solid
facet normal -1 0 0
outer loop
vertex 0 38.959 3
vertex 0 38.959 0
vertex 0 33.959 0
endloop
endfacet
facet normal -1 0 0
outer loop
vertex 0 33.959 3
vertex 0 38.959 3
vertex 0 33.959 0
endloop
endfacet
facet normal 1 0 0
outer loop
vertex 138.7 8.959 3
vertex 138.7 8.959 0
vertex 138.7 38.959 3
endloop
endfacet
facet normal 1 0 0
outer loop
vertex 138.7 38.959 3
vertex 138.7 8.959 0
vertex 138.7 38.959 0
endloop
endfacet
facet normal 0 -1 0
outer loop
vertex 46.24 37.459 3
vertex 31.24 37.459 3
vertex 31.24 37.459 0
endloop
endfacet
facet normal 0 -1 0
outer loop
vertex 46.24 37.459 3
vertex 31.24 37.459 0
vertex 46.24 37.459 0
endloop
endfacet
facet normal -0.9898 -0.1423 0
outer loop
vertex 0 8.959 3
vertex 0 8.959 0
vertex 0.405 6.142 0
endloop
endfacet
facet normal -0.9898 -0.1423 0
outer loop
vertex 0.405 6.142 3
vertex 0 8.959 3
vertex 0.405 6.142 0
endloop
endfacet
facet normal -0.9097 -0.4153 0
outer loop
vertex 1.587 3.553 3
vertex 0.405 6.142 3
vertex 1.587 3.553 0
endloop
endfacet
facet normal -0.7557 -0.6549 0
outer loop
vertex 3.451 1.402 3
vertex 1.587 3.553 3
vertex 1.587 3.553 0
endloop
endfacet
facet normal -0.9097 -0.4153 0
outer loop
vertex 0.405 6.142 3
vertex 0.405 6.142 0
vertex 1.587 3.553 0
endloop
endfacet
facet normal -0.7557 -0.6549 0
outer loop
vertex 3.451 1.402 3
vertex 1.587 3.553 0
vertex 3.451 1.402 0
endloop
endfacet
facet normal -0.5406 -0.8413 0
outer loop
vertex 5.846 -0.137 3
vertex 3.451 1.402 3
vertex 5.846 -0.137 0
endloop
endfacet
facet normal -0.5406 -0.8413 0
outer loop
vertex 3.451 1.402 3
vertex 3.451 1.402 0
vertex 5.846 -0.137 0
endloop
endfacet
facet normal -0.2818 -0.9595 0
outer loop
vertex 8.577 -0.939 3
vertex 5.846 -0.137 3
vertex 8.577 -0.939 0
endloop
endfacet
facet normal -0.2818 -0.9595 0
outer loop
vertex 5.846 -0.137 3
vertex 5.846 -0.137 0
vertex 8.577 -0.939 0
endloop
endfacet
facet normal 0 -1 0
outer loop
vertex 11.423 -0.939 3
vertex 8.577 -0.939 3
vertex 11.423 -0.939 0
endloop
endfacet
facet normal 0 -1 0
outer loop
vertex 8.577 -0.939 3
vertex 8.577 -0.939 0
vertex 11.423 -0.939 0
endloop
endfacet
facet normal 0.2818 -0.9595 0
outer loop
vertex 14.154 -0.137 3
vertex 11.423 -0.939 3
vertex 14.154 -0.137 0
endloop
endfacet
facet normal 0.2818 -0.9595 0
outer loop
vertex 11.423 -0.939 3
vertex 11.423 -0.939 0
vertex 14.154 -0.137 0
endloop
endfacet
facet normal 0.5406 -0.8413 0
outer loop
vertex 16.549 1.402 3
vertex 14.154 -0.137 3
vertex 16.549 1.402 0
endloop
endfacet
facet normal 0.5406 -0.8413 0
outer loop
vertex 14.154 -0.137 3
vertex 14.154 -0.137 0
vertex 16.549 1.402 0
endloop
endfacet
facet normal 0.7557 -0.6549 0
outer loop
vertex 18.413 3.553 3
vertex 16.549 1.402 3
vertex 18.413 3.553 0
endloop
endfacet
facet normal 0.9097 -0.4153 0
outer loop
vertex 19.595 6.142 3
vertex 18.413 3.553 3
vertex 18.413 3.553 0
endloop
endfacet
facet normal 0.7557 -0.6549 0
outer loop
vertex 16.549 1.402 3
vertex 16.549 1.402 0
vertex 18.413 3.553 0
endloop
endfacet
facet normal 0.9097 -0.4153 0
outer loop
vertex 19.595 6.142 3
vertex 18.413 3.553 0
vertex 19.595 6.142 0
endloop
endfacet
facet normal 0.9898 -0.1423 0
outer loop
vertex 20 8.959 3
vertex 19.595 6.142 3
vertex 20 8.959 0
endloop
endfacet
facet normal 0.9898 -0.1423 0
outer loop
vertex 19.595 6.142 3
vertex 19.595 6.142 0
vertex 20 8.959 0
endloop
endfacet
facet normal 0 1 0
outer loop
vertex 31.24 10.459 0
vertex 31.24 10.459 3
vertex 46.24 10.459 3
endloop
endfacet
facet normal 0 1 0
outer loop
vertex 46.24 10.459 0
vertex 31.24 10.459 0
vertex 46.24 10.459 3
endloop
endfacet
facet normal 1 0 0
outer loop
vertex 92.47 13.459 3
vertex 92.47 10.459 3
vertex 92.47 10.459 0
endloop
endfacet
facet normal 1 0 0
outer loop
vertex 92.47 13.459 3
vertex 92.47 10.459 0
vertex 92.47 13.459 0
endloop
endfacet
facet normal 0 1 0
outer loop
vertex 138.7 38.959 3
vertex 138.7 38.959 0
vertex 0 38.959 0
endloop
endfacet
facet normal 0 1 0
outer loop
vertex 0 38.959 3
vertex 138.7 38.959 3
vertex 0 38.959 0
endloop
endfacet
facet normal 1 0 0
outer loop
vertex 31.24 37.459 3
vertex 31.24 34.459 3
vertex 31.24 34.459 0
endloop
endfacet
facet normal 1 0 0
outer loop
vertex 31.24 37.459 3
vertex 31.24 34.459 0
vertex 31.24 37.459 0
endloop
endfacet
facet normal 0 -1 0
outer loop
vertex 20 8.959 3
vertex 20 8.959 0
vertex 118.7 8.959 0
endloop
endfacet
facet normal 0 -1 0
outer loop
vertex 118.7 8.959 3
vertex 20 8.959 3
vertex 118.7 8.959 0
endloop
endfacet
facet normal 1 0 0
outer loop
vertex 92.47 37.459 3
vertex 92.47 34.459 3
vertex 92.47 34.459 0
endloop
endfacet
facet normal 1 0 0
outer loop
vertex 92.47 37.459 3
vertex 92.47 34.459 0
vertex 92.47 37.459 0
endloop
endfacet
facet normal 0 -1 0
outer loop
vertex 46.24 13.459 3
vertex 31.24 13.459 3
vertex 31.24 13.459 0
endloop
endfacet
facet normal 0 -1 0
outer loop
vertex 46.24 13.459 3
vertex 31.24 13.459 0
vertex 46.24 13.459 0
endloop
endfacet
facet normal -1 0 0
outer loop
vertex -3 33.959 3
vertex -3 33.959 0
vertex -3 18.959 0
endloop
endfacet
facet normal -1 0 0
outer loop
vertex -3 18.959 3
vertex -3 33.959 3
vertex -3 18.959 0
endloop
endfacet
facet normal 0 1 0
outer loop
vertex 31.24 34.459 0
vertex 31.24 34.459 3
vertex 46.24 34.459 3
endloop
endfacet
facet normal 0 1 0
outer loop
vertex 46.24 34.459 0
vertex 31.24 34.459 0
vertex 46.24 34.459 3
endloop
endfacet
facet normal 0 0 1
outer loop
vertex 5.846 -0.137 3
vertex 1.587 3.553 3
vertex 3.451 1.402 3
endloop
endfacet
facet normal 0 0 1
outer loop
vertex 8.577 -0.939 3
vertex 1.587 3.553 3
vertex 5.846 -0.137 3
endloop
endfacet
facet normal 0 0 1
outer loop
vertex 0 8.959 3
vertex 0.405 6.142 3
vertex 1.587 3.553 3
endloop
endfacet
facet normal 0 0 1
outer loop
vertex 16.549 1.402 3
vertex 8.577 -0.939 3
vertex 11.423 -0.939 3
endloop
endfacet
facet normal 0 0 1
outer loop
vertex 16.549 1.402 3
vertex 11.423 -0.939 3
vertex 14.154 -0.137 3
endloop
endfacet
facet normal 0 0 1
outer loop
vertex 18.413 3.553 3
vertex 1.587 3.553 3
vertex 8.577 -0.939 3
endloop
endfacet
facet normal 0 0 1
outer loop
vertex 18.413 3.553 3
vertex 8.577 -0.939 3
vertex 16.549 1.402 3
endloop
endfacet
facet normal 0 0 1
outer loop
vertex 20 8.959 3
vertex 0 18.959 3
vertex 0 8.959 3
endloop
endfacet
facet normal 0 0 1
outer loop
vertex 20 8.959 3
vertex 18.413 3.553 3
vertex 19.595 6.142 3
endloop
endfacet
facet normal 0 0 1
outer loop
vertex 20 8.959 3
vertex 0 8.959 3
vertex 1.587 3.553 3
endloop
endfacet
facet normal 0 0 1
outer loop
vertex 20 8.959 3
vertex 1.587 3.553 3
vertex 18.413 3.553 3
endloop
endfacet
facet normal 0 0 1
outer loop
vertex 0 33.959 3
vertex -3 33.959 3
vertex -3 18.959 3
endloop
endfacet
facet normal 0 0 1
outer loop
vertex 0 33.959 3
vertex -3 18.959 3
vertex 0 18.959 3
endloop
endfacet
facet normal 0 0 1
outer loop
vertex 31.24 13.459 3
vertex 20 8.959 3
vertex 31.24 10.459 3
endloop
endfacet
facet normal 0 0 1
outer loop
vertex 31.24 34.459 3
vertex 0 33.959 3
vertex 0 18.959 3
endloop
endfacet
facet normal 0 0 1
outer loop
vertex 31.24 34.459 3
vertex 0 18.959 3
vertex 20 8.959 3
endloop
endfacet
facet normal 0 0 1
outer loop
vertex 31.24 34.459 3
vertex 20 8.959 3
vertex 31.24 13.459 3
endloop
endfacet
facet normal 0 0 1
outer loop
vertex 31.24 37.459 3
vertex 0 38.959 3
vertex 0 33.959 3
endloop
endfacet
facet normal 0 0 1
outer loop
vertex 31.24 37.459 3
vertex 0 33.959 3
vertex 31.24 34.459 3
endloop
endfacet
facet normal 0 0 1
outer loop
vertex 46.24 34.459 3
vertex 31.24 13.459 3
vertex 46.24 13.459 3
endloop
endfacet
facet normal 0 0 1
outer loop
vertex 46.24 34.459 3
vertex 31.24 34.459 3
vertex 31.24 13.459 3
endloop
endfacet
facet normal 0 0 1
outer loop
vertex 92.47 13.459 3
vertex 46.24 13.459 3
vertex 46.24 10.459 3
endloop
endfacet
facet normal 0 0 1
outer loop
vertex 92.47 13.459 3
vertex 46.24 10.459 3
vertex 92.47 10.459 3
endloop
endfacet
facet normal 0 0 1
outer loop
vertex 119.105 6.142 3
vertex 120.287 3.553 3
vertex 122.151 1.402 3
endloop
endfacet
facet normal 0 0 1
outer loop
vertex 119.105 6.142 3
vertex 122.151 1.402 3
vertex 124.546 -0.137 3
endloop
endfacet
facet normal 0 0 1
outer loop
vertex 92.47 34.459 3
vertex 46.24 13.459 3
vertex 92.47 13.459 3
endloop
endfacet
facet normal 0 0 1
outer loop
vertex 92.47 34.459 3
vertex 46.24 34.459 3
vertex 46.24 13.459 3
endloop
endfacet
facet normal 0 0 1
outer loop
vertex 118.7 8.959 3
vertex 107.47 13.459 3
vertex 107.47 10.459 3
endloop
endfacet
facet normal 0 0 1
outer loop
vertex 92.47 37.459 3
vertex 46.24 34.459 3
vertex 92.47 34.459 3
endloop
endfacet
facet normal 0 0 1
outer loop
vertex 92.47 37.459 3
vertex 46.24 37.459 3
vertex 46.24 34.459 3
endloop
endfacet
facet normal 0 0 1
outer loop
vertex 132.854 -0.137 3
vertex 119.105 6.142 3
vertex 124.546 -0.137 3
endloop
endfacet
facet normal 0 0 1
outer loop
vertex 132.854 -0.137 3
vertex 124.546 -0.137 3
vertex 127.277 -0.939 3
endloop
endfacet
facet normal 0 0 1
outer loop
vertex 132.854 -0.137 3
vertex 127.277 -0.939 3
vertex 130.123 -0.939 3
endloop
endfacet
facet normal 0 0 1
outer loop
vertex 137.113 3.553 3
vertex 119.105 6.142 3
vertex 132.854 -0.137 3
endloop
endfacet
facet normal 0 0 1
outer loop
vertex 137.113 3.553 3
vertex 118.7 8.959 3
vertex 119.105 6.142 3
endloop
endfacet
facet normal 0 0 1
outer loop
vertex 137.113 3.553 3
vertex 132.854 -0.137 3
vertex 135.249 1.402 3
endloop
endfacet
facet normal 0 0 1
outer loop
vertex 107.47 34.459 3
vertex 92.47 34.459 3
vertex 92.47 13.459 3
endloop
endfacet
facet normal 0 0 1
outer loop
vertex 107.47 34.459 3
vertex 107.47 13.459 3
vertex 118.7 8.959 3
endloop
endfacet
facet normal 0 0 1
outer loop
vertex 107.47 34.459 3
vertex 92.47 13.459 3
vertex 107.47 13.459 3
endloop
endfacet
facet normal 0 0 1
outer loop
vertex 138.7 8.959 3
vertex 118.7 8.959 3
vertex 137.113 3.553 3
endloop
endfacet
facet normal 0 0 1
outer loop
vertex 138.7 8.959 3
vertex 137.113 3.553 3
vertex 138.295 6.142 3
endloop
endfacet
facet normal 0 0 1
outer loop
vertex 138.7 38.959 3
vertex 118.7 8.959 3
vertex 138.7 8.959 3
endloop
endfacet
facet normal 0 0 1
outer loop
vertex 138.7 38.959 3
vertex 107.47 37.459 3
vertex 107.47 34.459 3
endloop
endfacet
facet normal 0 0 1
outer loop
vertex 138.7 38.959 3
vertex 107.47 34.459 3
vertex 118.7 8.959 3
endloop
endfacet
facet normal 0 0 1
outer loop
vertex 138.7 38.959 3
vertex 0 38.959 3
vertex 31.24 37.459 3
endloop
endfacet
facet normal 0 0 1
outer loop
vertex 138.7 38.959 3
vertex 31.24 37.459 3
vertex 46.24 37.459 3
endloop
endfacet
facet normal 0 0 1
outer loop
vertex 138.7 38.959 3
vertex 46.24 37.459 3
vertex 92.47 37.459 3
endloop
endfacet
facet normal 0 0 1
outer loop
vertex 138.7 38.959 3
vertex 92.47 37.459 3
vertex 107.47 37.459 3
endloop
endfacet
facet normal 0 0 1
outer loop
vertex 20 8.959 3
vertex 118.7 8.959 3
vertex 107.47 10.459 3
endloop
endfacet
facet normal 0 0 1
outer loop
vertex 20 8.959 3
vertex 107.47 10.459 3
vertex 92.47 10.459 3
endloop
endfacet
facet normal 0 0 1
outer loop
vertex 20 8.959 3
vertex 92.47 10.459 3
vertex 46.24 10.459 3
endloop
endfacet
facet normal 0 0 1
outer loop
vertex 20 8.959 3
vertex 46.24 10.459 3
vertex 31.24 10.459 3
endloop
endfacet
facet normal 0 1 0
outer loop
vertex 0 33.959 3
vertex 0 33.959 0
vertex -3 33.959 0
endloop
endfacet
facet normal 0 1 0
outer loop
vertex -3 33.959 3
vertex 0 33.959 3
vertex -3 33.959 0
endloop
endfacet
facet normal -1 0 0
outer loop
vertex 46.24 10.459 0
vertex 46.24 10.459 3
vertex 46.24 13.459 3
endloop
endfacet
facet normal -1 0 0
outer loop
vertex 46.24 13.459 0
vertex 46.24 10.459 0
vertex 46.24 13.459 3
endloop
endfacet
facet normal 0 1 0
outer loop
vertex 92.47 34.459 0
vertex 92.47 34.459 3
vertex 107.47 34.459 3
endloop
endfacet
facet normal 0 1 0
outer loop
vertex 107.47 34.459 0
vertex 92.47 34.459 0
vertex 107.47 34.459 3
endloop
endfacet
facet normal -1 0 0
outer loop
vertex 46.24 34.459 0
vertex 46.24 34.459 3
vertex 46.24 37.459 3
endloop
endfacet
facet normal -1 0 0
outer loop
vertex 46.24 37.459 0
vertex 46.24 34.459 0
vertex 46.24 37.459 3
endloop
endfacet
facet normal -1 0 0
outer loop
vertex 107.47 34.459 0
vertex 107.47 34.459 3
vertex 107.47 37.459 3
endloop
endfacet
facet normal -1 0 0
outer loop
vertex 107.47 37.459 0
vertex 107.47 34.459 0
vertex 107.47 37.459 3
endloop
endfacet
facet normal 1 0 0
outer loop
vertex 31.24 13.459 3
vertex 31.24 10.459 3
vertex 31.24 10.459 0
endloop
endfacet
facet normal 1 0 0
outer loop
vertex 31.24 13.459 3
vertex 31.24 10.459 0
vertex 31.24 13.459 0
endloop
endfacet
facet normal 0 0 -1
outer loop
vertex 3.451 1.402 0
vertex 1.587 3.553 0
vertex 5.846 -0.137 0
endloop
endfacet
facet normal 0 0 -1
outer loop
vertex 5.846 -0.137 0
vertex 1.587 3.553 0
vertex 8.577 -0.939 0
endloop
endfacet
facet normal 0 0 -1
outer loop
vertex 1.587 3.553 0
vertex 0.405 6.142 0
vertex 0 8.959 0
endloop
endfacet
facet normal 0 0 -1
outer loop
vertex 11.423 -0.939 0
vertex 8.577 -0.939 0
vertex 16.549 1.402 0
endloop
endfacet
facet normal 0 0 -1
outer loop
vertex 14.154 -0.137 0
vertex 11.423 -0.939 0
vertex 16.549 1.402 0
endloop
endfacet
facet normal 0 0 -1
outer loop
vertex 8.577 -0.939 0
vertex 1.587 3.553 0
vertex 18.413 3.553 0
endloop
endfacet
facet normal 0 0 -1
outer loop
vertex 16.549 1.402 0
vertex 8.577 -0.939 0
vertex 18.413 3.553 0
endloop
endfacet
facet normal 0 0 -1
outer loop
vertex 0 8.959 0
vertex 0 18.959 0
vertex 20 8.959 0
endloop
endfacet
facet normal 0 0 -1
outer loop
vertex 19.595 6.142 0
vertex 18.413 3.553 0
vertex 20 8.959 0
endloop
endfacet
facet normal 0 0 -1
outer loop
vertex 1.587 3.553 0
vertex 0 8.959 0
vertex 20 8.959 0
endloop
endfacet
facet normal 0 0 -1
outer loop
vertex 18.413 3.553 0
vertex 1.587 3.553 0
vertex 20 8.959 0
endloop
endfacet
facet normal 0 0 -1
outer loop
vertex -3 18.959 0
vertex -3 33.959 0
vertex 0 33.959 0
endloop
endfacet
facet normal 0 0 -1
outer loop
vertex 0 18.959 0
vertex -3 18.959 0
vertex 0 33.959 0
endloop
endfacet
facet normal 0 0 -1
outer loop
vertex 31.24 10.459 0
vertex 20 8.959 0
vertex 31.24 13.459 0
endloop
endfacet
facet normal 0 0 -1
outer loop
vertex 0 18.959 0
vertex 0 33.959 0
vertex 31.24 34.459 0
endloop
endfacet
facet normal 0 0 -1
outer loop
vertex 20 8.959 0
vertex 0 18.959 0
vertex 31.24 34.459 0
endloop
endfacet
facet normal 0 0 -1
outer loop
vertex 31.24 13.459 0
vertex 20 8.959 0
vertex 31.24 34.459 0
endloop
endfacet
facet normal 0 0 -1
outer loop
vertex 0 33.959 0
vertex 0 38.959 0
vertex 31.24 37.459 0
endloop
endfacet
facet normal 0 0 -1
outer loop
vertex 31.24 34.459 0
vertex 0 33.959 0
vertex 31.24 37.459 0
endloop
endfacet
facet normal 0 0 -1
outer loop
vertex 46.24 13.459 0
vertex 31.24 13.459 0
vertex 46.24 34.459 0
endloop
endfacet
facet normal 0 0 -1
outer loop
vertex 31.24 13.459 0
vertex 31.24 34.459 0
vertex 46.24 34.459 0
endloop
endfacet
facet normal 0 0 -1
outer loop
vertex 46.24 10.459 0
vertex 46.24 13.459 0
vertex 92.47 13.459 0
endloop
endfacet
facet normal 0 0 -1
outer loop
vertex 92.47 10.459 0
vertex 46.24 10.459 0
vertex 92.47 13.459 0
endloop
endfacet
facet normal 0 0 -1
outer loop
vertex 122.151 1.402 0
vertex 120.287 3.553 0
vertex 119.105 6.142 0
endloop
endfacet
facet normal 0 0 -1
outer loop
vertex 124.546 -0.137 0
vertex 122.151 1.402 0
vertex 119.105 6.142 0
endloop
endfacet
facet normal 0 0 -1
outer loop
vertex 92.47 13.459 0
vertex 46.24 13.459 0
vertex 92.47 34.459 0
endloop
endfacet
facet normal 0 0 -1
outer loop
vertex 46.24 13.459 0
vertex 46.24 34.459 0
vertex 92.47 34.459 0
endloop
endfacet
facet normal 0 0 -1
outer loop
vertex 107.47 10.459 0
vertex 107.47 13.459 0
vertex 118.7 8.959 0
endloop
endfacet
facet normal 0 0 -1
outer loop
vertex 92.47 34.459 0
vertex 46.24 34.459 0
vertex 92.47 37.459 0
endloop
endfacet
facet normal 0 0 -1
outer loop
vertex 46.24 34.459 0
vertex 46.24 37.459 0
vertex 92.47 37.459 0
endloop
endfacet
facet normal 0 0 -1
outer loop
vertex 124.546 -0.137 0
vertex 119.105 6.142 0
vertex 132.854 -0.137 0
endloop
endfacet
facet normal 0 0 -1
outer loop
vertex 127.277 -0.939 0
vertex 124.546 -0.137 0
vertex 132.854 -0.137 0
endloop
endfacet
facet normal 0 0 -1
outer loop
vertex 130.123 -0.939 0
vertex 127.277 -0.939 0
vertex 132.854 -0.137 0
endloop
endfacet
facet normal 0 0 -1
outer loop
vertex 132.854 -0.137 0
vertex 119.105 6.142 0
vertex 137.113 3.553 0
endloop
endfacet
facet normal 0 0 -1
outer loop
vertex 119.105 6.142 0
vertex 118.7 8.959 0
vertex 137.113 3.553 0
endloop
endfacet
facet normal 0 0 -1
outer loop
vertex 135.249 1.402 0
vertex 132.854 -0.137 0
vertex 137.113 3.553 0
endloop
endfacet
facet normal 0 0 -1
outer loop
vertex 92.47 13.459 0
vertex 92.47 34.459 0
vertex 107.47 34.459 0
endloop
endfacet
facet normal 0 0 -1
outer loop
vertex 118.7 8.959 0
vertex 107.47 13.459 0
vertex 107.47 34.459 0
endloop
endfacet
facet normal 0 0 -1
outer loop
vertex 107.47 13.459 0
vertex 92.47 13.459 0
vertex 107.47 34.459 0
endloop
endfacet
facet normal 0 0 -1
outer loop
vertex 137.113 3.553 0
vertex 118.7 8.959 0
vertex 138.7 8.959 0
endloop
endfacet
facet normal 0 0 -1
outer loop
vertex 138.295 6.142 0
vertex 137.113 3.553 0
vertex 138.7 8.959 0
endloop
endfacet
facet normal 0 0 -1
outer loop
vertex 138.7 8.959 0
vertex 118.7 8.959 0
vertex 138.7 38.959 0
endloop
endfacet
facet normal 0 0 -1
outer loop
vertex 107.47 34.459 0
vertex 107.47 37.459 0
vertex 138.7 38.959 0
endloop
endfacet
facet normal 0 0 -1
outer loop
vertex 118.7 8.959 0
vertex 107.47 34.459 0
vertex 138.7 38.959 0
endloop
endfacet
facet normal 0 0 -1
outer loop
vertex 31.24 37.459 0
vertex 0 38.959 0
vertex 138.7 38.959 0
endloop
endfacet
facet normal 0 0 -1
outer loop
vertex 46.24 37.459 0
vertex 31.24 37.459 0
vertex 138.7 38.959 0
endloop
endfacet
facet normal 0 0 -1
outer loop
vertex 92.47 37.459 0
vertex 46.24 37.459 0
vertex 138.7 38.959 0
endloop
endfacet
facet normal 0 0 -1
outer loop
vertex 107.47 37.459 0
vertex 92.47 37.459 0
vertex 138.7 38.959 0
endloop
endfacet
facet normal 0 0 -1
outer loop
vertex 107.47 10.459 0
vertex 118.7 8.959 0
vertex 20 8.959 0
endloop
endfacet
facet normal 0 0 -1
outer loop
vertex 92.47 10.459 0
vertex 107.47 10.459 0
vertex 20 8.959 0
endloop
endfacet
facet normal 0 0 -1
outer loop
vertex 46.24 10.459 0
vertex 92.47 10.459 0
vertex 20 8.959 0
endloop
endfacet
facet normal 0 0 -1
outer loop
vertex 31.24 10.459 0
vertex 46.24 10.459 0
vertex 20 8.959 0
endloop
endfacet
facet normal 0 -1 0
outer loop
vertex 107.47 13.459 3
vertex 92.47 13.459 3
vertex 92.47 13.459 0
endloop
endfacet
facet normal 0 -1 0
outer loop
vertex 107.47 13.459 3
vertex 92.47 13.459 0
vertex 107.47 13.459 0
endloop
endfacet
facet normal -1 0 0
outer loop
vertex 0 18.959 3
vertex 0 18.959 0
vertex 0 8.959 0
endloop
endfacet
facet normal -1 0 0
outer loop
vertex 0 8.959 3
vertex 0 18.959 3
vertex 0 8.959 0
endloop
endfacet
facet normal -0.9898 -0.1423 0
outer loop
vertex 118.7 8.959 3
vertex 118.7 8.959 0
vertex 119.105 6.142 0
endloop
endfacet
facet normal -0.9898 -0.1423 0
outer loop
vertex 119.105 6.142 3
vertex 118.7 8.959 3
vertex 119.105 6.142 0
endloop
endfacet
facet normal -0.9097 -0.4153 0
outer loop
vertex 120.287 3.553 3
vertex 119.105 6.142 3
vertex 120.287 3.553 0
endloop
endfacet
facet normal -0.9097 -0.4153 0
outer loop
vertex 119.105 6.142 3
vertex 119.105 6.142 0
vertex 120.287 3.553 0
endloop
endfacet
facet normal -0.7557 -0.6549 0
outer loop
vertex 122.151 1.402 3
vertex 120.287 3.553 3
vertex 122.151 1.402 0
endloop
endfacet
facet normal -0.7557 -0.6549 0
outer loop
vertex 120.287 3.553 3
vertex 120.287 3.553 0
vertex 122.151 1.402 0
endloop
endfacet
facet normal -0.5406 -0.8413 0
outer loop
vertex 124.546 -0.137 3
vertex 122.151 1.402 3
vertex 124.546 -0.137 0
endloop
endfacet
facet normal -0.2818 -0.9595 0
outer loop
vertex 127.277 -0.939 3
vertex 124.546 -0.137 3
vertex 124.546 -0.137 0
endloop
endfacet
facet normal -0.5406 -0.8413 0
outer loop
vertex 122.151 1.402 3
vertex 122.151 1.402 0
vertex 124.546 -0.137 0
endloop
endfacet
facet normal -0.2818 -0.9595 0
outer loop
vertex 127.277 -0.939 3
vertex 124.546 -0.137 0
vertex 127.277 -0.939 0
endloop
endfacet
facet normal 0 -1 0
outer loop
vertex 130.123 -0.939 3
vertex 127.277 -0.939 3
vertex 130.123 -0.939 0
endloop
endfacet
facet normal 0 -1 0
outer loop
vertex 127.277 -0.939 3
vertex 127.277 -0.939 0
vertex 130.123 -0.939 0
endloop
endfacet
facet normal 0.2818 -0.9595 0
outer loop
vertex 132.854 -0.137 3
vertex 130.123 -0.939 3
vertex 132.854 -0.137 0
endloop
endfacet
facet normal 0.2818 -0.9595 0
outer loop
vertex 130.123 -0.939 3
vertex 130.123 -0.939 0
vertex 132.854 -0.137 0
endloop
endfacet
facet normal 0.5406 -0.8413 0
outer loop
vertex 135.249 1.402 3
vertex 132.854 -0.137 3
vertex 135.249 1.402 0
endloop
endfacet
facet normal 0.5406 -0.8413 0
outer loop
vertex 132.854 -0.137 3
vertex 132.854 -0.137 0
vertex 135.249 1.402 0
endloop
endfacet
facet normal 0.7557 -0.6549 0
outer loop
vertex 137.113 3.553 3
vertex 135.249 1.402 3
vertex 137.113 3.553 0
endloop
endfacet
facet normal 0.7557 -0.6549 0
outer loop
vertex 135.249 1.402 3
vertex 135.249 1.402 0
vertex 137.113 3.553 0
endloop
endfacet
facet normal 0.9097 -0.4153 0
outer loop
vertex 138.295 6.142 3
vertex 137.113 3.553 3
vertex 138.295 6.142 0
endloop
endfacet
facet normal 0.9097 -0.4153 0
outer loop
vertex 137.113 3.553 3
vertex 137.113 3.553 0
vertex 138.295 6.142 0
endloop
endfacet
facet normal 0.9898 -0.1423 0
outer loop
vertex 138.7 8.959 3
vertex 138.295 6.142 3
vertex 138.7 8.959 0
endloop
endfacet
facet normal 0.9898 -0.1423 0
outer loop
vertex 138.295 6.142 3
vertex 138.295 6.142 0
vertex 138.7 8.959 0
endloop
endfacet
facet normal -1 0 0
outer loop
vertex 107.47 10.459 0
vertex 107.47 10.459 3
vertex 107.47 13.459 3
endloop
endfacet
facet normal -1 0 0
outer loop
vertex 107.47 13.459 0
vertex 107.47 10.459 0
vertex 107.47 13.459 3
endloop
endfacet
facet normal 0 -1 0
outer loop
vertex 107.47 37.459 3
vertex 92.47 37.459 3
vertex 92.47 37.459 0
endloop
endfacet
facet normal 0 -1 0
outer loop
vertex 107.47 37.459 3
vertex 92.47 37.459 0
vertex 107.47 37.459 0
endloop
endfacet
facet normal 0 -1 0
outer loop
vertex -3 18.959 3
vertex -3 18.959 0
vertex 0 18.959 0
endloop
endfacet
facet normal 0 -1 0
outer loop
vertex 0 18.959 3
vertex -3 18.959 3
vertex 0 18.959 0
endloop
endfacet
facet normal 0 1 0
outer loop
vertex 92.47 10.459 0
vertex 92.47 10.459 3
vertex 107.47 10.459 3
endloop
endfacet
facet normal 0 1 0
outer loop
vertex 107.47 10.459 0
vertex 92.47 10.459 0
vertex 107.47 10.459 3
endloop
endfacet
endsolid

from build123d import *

# Parameters (mm, degrees)
BOSS_EXTRUDE1_DEPTH = 3
SKETCH2_W           = 15
SKETCH2_H           = 3
CUT_EXTRUDE1_DEPTH  = 4


with BuildPart() as part:
    # Sketch1 → Boss-Extrude1 (new body)
    with BuildSketch(Plane.XY):
        with BuildLine():
            Line((138.7, 8.95909513), (138.7, 38.95909513))
            Line((138.7, 38.95909513), (0, 38.95909513))
            Line((0, 38.95909513), (0, 33.95909513))
            Line((0, 33.95909513), (-3, 33.95909513))
            Line((-3, 33.95909513), (-3, 18.95909513))
            Line((-3, 18.95909513), (0, 18.95909513))
            Line((0, 18.95909513), (0, 8.95909513))
            ThreePointArc((0, 8.95909513), (10, -1.04090487), (20, 8.95909513))
            Line((20, 8.95909513), (118.7, 8.95909513))
            ThreePointArc((118.7, 8.95909513), (128.7, -1.04090487), (138.7, 8.95909513))
        make_face()
    extrude(amount=BOSS_EXTRUDE1_DEPTH)

    # Sketch2 → Cut-Extrude1 (cut, through all)
    with BuildSketch(Plane.XY.offset(3)):
        with Locations((38.74, 35.95909513)):
            Rectangle(SKETCH2_W, SKETCH2_H)
        with Locations((99.97, 35.95909513)):
            Rectangle(SKETCH2_W, SKETCH2_H)
        with Locations((38.74, 11.95909513)):
            Rectangle(SKETCH2_W, SKETCH2_H)
        with Locations((99.97, 11.95909513)):
            Rectangle(SKETCH2_W, SKETCH2_H)
    extrude(amount=-CUT_EXTRUDE1_DEPTH, mode=Mode.SUBTRACT)


solid = part.part
